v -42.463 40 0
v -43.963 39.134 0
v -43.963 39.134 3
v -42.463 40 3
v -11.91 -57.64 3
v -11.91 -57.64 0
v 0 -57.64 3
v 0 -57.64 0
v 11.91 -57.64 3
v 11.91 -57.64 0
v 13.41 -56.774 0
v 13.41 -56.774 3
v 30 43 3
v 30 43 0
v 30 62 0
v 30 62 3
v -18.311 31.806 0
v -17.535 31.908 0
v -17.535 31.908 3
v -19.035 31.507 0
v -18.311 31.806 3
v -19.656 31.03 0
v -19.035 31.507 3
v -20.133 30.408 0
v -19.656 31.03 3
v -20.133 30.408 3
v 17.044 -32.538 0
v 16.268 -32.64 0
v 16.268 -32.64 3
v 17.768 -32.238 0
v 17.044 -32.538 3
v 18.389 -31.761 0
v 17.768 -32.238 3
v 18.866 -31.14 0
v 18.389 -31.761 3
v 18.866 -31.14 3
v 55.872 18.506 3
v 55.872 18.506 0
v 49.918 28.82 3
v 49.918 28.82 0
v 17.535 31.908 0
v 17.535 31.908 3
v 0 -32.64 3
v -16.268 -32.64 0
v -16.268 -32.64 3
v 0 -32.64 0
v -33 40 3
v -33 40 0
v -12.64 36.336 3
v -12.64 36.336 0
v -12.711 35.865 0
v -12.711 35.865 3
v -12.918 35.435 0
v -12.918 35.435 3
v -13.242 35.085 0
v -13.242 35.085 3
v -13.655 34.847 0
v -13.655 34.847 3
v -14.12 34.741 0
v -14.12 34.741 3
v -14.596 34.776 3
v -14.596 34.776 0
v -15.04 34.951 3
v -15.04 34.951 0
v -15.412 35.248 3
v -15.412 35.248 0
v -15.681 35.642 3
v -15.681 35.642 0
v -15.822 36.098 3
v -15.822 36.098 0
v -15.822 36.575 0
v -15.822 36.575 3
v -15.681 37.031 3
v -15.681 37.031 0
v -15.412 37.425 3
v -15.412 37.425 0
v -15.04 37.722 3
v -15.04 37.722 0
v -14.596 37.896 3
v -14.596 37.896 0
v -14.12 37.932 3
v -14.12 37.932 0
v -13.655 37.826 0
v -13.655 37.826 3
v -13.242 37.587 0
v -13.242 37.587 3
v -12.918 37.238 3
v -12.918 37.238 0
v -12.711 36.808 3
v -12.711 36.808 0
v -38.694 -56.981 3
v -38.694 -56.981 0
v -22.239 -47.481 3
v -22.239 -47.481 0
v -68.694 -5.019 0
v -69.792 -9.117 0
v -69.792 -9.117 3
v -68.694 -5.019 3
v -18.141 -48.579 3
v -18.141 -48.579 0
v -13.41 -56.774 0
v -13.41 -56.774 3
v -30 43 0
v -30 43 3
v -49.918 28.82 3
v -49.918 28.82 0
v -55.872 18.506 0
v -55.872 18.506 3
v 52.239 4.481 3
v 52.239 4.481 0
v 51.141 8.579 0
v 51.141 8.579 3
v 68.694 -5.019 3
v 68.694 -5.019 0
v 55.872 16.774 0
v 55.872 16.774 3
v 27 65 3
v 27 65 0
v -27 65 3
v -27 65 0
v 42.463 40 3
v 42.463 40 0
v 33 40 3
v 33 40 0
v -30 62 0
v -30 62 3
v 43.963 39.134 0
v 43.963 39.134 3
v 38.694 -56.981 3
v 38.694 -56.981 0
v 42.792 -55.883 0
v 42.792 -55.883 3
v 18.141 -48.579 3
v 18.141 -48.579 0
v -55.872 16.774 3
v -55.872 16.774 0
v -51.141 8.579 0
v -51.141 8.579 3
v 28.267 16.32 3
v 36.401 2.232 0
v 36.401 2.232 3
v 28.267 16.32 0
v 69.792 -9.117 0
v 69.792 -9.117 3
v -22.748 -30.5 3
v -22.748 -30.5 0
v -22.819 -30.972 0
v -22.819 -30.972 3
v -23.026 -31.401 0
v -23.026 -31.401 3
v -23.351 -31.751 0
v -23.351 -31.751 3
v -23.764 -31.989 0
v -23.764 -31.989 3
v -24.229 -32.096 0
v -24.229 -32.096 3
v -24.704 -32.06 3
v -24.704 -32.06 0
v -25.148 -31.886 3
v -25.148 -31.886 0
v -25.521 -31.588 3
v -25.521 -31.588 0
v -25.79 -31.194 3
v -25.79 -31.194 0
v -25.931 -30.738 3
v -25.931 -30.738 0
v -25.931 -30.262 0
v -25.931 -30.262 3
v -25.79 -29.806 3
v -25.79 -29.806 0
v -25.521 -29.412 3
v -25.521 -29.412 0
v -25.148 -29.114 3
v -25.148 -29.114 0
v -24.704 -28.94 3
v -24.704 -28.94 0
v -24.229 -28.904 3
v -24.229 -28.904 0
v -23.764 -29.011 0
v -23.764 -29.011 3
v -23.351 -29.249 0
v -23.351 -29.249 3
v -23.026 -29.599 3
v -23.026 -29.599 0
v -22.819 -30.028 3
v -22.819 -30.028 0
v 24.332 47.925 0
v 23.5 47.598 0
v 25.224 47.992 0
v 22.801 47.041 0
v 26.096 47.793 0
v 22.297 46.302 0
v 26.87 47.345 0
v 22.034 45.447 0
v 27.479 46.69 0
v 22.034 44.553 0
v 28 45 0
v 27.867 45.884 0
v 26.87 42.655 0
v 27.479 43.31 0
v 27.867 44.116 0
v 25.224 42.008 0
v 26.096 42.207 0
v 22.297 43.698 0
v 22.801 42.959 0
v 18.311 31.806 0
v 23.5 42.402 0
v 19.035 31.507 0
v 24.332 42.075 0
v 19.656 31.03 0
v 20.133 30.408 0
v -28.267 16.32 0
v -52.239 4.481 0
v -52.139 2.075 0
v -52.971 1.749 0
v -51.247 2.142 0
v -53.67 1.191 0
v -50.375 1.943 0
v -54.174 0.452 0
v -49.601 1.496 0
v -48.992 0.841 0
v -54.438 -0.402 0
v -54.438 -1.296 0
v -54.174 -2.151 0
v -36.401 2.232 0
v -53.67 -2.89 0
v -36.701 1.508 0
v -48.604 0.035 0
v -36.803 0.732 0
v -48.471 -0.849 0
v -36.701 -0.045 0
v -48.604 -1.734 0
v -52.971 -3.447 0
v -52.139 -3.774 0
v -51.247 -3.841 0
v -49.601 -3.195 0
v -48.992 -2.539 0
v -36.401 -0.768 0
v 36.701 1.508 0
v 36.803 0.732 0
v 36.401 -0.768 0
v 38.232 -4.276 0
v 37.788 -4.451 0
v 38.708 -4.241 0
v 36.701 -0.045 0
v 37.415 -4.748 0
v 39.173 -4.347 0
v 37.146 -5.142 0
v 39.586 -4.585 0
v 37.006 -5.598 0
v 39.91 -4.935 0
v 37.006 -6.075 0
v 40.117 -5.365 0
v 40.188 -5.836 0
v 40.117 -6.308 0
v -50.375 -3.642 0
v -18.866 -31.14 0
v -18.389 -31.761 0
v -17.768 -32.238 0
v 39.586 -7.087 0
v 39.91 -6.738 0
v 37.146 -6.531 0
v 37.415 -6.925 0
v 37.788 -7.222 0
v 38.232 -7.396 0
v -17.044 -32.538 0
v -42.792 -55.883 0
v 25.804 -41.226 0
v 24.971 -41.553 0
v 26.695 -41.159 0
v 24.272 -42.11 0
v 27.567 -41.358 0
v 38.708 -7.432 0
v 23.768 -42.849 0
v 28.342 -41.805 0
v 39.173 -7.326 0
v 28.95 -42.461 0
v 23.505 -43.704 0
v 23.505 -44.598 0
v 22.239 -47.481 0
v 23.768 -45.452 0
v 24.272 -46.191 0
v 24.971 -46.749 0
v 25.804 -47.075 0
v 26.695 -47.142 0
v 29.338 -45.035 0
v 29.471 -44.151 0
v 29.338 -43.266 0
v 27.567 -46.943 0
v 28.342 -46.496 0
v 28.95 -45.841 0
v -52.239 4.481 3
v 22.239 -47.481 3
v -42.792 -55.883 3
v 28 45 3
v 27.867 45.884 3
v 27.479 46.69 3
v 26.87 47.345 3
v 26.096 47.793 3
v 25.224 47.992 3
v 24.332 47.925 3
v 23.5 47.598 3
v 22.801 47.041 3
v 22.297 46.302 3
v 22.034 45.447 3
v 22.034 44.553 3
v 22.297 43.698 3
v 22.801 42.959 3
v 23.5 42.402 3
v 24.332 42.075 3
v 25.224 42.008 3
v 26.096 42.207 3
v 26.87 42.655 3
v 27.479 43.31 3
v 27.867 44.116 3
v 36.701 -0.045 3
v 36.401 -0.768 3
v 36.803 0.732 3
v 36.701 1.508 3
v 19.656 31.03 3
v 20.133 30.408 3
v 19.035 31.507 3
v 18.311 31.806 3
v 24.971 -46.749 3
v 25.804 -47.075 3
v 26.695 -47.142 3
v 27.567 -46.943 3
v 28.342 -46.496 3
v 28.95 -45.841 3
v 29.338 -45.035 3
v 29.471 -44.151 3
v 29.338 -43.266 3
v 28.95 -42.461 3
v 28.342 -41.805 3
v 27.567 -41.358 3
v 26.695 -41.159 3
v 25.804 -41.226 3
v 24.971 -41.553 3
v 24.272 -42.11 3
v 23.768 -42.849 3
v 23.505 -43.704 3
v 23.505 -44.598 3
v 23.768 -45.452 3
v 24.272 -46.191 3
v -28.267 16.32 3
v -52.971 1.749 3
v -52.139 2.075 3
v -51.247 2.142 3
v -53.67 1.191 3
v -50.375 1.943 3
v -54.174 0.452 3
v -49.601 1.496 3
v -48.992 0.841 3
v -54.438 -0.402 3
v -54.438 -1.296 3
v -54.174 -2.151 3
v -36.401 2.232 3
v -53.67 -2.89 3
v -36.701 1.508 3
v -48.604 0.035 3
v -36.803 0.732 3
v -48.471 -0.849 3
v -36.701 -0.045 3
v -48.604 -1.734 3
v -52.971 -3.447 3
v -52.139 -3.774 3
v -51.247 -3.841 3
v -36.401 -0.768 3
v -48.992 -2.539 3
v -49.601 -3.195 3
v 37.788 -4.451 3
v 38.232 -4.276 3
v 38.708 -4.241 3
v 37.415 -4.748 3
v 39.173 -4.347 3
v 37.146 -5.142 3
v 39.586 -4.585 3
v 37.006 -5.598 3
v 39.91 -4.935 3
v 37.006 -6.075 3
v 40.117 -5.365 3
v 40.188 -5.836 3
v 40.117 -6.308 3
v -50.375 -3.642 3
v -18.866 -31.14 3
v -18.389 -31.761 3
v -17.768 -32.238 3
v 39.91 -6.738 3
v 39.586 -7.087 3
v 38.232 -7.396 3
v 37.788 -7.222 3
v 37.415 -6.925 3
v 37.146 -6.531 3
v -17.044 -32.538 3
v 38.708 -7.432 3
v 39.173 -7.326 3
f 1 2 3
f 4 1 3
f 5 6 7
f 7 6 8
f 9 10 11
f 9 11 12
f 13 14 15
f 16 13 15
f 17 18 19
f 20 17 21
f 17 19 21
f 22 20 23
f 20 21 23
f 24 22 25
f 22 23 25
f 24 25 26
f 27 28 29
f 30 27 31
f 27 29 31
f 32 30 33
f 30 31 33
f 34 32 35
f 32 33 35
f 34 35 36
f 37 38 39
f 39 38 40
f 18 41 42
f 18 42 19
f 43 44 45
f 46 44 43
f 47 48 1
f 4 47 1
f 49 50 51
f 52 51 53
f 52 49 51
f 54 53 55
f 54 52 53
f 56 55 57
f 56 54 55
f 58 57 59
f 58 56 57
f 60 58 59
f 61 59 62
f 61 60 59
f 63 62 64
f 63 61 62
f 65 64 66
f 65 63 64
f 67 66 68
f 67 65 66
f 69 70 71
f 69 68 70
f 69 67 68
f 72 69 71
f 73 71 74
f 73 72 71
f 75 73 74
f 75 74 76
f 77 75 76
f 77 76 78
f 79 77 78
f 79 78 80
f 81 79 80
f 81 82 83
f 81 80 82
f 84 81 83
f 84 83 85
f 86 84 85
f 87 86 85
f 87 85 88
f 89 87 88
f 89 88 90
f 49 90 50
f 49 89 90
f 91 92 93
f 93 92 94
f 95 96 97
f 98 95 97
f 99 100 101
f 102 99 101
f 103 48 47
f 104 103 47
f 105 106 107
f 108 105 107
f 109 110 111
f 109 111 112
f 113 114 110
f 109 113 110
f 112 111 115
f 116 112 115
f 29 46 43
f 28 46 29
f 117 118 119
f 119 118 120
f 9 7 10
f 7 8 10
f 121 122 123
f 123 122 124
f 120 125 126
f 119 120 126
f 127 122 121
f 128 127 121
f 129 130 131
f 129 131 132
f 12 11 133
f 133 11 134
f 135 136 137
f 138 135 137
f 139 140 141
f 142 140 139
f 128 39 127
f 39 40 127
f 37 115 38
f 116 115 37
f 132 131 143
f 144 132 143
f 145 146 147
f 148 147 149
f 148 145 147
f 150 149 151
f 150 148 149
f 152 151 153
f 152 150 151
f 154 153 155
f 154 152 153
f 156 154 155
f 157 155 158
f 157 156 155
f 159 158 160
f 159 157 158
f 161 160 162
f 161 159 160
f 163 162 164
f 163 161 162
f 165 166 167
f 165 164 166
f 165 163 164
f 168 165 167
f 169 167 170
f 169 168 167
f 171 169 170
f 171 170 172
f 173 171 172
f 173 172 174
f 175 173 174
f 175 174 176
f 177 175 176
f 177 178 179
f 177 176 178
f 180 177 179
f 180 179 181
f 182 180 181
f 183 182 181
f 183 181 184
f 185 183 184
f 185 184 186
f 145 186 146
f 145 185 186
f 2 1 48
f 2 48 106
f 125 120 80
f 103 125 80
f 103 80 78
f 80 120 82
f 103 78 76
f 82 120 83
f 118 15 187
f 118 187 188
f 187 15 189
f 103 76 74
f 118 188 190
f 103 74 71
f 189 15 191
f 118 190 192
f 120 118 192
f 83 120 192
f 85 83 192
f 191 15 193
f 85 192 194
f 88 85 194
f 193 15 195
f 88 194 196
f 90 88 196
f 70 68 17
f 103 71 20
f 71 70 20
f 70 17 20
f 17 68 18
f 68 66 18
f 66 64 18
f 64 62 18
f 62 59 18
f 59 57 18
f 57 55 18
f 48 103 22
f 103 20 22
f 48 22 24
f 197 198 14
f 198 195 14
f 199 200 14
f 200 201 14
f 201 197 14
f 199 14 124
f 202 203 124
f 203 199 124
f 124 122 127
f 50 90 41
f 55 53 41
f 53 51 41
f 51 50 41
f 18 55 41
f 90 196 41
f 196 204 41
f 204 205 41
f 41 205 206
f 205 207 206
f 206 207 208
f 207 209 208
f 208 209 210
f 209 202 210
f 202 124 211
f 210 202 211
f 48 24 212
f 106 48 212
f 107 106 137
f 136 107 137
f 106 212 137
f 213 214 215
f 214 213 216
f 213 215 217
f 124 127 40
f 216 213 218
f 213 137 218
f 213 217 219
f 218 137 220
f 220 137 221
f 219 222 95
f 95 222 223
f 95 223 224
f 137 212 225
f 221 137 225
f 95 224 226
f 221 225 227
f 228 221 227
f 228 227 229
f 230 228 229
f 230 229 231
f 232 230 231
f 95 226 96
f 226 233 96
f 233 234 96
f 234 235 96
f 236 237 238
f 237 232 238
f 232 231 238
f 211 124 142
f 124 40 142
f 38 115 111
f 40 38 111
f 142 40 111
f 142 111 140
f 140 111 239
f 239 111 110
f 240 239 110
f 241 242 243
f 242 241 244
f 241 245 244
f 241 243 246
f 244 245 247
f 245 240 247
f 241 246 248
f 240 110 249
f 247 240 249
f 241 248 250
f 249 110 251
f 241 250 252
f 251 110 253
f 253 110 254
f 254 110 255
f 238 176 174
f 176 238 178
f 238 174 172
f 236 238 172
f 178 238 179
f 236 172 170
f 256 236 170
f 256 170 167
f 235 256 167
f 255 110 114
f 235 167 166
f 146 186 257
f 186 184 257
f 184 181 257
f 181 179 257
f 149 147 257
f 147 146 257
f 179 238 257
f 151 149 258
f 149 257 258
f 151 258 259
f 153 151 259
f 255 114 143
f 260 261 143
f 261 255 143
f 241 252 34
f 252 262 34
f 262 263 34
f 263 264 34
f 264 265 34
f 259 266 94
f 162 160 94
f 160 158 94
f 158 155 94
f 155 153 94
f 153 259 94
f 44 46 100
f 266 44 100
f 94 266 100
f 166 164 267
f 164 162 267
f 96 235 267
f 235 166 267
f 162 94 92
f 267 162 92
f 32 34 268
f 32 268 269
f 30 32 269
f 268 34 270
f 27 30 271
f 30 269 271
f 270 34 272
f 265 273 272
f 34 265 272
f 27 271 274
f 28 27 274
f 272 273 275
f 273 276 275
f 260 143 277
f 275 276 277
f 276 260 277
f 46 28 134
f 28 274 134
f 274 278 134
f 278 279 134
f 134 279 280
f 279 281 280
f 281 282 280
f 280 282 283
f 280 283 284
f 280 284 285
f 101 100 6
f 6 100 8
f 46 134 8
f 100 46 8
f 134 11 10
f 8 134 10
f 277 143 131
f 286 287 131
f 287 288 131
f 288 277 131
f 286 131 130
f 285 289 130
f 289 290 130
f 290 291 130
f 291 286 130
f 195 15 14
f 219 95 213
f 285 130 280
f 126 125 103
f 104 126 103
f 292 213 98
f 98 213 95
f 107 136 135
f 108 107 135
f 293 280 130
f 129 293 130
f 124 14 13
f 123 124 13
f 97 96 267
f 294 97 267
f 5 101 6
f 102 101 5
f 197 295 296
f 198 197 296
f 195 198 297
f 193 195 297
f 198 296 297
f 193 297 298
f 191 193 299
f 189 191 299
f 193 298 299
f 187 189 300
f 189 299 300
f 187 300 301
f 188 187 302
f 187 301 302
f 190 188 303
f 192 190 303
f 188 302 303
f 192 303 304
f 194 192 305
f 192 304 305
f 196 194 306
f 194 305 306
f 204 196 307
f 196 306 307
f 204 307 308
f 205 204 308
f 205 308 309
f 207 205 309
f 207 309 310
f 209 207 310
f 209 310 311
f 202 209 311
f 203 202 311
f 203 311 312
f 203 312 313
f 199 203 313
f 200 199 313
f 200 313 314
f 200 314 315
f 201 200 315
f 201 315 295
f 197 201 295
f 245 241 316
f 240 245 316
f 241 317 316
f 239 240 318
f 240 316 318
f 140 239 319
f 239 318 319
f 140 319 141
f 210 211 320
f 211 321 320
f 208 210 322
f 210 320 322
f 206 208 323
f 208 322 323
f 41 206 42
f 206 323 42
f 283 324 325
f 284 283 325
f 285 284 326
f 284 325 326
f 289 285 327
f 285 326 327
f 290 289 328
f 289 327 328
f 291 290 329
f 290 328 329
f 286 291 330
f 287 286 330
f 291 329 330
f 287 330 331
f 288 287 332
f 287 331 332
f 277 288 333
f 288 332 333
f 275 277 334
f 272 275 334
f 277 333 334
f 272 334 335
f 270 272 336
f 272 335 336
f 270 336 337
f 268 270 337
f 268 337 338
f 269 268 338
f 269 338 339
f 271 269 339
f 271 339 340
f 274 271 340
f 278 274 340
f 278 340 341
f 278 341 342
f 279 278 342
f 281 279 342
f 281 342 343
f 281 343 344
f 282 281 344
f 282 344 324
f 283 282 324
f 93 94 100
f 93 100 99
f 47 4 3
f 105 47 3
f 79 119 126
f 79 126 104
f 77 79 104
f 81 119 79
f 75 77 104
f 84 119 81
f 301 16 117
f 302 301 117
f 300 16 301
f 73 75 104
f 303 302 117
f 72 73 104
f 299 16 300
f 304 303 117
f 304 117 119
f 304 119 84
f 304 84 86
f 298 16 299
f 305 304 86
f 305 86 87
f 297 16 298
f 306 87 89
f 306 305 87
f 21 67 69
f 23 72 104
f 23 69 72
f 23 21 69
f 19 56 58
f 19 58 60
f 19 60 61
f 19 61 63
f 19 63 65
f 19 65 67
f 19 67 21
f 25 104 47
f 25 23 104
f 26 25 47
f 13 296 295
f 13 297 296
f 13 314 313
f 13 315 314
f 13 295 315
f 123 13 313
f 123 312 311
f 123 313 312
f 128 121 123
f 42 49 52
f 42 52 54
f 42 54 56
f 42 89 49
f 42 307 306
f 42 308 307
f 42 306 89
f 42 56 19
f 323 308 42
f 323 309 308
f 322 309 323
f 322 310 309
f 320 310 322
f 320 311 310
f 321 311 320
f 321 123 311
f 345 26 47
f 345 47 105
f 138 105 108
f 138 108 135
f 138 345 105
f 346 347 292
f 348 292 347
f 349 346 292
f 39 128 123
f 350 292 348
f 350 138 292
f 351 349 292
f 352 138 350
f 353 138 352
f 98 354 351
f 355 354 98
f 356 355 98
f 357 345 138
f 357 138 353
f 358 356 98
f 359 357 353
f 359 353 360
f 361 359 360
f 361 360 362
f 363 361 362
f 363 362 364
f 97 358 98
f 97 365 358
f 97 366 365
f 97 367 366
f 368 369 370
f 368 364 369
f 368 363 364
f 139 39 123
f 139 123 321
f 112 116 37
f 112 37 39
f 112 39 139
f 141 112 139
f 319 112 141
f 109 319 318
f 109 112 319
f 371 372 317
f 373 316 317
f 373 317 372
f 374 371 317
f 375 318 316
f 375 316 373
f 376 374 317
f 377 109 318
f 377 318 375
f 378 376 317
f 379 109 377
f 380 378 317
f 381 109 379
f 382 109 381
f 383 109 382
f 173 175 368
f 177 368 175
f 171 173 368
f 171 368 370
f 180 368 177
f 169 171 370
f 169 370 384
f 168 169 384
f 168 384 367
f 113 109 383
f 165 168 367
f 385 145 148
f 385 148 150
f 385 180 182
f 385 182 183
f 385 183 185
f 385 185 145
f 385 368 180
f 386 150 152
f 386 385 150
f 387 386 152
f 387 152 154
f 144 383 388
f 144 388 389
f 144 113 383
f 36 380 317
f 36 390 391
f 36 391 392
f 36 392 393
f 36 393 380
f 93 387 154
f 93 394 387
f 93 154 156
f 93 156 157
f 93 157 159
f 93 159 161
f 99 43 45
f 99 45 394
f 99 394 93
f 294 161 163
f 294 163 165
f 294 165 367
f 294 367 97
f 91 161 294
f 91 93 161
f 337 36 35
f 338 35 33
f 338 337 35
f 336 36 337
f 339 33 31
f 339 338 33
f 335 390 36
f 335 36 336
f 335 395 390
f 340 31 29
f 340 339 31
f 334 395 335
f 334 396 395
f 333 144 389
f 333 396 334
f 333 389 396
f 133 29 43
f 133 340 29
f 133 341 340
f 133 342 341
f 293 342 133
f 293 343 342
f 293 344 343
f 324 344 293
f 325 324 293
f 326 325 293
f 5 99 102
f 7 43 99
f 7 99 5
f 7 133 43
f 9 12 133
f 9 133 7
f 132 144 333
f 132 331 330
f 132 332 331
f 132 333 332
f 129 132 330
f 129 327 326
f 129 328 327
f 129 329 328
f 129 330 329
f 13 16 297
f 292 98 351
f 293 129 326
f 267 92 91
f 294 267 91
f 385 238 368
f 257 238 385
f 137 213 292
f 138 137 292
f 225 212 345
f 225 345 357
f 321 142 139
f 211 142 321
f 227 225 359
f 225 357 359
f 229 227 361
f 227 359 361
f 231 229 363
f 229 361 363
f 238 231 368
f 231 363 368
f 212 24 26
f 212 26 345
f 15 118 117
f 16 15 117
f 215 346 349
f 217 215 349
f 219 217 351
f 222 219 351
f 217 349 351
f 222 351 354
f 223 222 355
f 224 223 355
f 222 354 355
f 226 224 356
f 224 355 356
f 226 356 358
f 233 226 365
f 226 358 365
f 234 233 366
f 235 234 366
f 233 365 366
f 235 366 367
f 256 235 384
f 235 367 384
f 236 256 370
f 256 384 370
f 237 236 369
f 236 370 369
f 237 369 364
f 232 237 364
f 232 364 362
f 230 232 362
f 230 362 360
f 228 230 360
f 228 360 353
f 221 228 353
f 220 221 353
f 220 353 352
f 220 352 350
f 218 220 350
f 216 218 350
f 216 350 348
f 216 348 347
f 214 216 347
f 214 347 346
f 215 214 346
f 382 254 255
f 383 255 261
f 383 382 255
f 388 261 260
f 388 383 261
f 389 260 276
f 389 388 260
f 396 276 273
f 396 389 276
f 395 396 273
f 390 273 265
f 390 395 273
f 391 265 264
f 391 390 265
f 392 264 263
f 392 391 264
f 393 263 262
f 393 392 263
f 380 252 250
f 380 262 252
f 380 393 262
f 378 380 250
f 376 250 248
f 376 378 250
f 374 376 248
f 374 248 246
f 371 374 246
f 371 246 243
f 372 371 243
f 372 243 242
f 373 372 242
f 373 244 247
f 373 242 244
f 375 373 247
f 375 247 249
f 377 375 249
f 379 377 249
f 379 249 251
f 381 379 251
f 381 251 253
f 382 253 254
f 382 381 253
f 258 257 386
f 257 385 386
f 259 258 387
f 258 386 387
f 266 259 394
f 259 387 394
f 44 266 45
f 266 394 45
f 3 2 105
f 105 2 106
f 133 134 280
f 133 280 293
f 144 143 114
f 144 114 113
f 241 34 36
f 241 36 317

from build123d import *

# Parameters (mm, degrees)
SKETCH_R              = 1.6
PAD_DEPTH             = 3
POLARPATTERN_COUNT    = 3
POCKET_DEPTH          = 380.288671
POLARPATTERN001_COUNT = 3
CHAMFER_SIZE          = 1
FILLET_R              = 3
SKETCH066_R           = 1.6
POCKET032_DEPTH       = 3.001
SKETCH078_R           = 3
POCKET038_DEPTH       = 5
POLARPATTERN007_COUNT = 3
CHAMFER017_SIZE       = 3


with BuildPart() as part:
    # Sketch → Pad (new body)
    with BuildSketch(Plane.XY):
        Polygon((0, 0), (-49.917704, 28.82), (-56.37248, 17.64), (-49.641016, 5.980762), (-58.30127, 0.980762), (-71.291651, -6.519238), (-41.291651, -58.480762), (-28.30127, -50.980762), (-19.641016, -45.980762), (-12.909552, -57.64), (0, -57.64), align=None)
        with Locations((-51.471143, -0.849365)):
            Circle(SKETCH_R, mode=Mode.SUBTRACT)
    pad = extrude(amount=PAD_DEPTH)

    # PolarPattern: Pad ×3 about axis
    polarpattern_axis = Axis((0, 0, 0), (0, 0, 1))
    for i in range(1, POLARPATTERN_COUNT):
        add(pad.rotate(polarpattern_axis, i * 360 / POLARPATTERN_COUNT))

    # Sketch001 → Pocket (cut, through all)
    with BuildSketch(Plane.XY):
        Polygon((-28.267069, 16.32), (-37.267069, 0.731543), (-18, -32.64), (0, -32.64), (0, 0), align=None)
    pocket = extrude(amount=POCKET_DEPTH, mode=Mode.SUBTRACT)

    # PolarPattern001: Pocket ×3 about axis
    polarpattern001_axis = Axis((0, 0, 0), (0, 0, 1))
    for i in range(1, POLARPATTERN001_COUNT):
        add(pocket.rotate(polarpattern001_axis, i * 360 / POLARPATTERN001_COUNT), mode=Mode.SUBTRACT)

    # Chamfer
    chamfer_edges = [part.edges().sort_by_distance(p)[0] for p in [
        (-56.37248, 17.64, 1.5),
        (-43.462928, 40, 1.5),
        (43.462928, 40, 1.5),
        (56.37248, 17.64, 1.5),
        (12.909552, -57.64, 1.5),
        (-12.909552, -57.64, 1.5),
    ]]
    chamfer(chamfer_edges, length=CHAMFER_SIZE)

    # Fillet
    fillet_edges = [part.edges().sort_by_distance(p)[0] for p in [
        (-19.267069, 31.908457, 1.5),
        (18, -32.64, 1.5),
        (-18, -32.64, 1.5),
        (37.267069, 0.731543, 1.5),
        (19.267069, 31.908457, 1.5),
        (-37.267069, 0.731543, 1.5),
    ]]
    fillet(fillet_edges, radius=FILLET_R)

    # Sketch066 (on Binder) → Pocket032 (cut, through all)
    with BuildSketch(Plane(origin=(0, 0, 3), x_dir=(1, 0, 0), z_dir=(0, 0, -1))):
        with Locations((-24.348373, 30.5)):
            Circle(SKETCH066_R)
        with Locations((38.587961, 5.836309)):
            Circle(SKETCH066_R)
        with Locations((-14.239588, -36.336309)):
            Circle(SKETCH066_R)
    extrude(amount=POCKET032_DEPTH, mode=Mode.SUBTRACT)

    # Sketch078 (on Face44 of Pocket032) → Pocket038 (cut)
    with BuildSketch(Plane.XY.offset(3)):
        with Locations((25, 45)):
            Circle(SKETCH078_R)
    pocket038 = extrude(amount=-POCKET038_DEPTH, mode=Mode.SUBTRACT)

    # PolarPattern007: Pocket038 ×3 about axis
    polarpattern007_axis = Axis((0, 0, 3), (0, 0, 1))
    for i in range(1, POLARPATTERN007_COUNT):
        add(pocket038.rotate(polarpattern007_axis, i * 360 / POLARPATTERN007_COUNT), mode=Mode.SUBTRACT)

    # Chamfer017
    chamfer017_edges = [part.edges().sort_by_distance(p)[0] for p in [
        (-41.291651, -58.480762, 1.5),
        (-71.291651, -6.519238, 1.5),
        (-30, 65, 1.5),
        (41.291651, -58.480762, 1.5),
        (71.291651, -6.519238, 1.5),
        (30, 65, 1.5),
        (-19.641016, -45.980762, 1.5),
        (49.641016, 5.980762, 1.5),
        (-30, 40, 1.5),
        (30, 40, 1.5),
        (-49.641016, 5.980762, 1.5),
        (19.641016, -45.980762, 1.5),
    ]]
    chamfer(chamfer017_edges, length=CHAMFER017_SIZE)


solid = part.part
